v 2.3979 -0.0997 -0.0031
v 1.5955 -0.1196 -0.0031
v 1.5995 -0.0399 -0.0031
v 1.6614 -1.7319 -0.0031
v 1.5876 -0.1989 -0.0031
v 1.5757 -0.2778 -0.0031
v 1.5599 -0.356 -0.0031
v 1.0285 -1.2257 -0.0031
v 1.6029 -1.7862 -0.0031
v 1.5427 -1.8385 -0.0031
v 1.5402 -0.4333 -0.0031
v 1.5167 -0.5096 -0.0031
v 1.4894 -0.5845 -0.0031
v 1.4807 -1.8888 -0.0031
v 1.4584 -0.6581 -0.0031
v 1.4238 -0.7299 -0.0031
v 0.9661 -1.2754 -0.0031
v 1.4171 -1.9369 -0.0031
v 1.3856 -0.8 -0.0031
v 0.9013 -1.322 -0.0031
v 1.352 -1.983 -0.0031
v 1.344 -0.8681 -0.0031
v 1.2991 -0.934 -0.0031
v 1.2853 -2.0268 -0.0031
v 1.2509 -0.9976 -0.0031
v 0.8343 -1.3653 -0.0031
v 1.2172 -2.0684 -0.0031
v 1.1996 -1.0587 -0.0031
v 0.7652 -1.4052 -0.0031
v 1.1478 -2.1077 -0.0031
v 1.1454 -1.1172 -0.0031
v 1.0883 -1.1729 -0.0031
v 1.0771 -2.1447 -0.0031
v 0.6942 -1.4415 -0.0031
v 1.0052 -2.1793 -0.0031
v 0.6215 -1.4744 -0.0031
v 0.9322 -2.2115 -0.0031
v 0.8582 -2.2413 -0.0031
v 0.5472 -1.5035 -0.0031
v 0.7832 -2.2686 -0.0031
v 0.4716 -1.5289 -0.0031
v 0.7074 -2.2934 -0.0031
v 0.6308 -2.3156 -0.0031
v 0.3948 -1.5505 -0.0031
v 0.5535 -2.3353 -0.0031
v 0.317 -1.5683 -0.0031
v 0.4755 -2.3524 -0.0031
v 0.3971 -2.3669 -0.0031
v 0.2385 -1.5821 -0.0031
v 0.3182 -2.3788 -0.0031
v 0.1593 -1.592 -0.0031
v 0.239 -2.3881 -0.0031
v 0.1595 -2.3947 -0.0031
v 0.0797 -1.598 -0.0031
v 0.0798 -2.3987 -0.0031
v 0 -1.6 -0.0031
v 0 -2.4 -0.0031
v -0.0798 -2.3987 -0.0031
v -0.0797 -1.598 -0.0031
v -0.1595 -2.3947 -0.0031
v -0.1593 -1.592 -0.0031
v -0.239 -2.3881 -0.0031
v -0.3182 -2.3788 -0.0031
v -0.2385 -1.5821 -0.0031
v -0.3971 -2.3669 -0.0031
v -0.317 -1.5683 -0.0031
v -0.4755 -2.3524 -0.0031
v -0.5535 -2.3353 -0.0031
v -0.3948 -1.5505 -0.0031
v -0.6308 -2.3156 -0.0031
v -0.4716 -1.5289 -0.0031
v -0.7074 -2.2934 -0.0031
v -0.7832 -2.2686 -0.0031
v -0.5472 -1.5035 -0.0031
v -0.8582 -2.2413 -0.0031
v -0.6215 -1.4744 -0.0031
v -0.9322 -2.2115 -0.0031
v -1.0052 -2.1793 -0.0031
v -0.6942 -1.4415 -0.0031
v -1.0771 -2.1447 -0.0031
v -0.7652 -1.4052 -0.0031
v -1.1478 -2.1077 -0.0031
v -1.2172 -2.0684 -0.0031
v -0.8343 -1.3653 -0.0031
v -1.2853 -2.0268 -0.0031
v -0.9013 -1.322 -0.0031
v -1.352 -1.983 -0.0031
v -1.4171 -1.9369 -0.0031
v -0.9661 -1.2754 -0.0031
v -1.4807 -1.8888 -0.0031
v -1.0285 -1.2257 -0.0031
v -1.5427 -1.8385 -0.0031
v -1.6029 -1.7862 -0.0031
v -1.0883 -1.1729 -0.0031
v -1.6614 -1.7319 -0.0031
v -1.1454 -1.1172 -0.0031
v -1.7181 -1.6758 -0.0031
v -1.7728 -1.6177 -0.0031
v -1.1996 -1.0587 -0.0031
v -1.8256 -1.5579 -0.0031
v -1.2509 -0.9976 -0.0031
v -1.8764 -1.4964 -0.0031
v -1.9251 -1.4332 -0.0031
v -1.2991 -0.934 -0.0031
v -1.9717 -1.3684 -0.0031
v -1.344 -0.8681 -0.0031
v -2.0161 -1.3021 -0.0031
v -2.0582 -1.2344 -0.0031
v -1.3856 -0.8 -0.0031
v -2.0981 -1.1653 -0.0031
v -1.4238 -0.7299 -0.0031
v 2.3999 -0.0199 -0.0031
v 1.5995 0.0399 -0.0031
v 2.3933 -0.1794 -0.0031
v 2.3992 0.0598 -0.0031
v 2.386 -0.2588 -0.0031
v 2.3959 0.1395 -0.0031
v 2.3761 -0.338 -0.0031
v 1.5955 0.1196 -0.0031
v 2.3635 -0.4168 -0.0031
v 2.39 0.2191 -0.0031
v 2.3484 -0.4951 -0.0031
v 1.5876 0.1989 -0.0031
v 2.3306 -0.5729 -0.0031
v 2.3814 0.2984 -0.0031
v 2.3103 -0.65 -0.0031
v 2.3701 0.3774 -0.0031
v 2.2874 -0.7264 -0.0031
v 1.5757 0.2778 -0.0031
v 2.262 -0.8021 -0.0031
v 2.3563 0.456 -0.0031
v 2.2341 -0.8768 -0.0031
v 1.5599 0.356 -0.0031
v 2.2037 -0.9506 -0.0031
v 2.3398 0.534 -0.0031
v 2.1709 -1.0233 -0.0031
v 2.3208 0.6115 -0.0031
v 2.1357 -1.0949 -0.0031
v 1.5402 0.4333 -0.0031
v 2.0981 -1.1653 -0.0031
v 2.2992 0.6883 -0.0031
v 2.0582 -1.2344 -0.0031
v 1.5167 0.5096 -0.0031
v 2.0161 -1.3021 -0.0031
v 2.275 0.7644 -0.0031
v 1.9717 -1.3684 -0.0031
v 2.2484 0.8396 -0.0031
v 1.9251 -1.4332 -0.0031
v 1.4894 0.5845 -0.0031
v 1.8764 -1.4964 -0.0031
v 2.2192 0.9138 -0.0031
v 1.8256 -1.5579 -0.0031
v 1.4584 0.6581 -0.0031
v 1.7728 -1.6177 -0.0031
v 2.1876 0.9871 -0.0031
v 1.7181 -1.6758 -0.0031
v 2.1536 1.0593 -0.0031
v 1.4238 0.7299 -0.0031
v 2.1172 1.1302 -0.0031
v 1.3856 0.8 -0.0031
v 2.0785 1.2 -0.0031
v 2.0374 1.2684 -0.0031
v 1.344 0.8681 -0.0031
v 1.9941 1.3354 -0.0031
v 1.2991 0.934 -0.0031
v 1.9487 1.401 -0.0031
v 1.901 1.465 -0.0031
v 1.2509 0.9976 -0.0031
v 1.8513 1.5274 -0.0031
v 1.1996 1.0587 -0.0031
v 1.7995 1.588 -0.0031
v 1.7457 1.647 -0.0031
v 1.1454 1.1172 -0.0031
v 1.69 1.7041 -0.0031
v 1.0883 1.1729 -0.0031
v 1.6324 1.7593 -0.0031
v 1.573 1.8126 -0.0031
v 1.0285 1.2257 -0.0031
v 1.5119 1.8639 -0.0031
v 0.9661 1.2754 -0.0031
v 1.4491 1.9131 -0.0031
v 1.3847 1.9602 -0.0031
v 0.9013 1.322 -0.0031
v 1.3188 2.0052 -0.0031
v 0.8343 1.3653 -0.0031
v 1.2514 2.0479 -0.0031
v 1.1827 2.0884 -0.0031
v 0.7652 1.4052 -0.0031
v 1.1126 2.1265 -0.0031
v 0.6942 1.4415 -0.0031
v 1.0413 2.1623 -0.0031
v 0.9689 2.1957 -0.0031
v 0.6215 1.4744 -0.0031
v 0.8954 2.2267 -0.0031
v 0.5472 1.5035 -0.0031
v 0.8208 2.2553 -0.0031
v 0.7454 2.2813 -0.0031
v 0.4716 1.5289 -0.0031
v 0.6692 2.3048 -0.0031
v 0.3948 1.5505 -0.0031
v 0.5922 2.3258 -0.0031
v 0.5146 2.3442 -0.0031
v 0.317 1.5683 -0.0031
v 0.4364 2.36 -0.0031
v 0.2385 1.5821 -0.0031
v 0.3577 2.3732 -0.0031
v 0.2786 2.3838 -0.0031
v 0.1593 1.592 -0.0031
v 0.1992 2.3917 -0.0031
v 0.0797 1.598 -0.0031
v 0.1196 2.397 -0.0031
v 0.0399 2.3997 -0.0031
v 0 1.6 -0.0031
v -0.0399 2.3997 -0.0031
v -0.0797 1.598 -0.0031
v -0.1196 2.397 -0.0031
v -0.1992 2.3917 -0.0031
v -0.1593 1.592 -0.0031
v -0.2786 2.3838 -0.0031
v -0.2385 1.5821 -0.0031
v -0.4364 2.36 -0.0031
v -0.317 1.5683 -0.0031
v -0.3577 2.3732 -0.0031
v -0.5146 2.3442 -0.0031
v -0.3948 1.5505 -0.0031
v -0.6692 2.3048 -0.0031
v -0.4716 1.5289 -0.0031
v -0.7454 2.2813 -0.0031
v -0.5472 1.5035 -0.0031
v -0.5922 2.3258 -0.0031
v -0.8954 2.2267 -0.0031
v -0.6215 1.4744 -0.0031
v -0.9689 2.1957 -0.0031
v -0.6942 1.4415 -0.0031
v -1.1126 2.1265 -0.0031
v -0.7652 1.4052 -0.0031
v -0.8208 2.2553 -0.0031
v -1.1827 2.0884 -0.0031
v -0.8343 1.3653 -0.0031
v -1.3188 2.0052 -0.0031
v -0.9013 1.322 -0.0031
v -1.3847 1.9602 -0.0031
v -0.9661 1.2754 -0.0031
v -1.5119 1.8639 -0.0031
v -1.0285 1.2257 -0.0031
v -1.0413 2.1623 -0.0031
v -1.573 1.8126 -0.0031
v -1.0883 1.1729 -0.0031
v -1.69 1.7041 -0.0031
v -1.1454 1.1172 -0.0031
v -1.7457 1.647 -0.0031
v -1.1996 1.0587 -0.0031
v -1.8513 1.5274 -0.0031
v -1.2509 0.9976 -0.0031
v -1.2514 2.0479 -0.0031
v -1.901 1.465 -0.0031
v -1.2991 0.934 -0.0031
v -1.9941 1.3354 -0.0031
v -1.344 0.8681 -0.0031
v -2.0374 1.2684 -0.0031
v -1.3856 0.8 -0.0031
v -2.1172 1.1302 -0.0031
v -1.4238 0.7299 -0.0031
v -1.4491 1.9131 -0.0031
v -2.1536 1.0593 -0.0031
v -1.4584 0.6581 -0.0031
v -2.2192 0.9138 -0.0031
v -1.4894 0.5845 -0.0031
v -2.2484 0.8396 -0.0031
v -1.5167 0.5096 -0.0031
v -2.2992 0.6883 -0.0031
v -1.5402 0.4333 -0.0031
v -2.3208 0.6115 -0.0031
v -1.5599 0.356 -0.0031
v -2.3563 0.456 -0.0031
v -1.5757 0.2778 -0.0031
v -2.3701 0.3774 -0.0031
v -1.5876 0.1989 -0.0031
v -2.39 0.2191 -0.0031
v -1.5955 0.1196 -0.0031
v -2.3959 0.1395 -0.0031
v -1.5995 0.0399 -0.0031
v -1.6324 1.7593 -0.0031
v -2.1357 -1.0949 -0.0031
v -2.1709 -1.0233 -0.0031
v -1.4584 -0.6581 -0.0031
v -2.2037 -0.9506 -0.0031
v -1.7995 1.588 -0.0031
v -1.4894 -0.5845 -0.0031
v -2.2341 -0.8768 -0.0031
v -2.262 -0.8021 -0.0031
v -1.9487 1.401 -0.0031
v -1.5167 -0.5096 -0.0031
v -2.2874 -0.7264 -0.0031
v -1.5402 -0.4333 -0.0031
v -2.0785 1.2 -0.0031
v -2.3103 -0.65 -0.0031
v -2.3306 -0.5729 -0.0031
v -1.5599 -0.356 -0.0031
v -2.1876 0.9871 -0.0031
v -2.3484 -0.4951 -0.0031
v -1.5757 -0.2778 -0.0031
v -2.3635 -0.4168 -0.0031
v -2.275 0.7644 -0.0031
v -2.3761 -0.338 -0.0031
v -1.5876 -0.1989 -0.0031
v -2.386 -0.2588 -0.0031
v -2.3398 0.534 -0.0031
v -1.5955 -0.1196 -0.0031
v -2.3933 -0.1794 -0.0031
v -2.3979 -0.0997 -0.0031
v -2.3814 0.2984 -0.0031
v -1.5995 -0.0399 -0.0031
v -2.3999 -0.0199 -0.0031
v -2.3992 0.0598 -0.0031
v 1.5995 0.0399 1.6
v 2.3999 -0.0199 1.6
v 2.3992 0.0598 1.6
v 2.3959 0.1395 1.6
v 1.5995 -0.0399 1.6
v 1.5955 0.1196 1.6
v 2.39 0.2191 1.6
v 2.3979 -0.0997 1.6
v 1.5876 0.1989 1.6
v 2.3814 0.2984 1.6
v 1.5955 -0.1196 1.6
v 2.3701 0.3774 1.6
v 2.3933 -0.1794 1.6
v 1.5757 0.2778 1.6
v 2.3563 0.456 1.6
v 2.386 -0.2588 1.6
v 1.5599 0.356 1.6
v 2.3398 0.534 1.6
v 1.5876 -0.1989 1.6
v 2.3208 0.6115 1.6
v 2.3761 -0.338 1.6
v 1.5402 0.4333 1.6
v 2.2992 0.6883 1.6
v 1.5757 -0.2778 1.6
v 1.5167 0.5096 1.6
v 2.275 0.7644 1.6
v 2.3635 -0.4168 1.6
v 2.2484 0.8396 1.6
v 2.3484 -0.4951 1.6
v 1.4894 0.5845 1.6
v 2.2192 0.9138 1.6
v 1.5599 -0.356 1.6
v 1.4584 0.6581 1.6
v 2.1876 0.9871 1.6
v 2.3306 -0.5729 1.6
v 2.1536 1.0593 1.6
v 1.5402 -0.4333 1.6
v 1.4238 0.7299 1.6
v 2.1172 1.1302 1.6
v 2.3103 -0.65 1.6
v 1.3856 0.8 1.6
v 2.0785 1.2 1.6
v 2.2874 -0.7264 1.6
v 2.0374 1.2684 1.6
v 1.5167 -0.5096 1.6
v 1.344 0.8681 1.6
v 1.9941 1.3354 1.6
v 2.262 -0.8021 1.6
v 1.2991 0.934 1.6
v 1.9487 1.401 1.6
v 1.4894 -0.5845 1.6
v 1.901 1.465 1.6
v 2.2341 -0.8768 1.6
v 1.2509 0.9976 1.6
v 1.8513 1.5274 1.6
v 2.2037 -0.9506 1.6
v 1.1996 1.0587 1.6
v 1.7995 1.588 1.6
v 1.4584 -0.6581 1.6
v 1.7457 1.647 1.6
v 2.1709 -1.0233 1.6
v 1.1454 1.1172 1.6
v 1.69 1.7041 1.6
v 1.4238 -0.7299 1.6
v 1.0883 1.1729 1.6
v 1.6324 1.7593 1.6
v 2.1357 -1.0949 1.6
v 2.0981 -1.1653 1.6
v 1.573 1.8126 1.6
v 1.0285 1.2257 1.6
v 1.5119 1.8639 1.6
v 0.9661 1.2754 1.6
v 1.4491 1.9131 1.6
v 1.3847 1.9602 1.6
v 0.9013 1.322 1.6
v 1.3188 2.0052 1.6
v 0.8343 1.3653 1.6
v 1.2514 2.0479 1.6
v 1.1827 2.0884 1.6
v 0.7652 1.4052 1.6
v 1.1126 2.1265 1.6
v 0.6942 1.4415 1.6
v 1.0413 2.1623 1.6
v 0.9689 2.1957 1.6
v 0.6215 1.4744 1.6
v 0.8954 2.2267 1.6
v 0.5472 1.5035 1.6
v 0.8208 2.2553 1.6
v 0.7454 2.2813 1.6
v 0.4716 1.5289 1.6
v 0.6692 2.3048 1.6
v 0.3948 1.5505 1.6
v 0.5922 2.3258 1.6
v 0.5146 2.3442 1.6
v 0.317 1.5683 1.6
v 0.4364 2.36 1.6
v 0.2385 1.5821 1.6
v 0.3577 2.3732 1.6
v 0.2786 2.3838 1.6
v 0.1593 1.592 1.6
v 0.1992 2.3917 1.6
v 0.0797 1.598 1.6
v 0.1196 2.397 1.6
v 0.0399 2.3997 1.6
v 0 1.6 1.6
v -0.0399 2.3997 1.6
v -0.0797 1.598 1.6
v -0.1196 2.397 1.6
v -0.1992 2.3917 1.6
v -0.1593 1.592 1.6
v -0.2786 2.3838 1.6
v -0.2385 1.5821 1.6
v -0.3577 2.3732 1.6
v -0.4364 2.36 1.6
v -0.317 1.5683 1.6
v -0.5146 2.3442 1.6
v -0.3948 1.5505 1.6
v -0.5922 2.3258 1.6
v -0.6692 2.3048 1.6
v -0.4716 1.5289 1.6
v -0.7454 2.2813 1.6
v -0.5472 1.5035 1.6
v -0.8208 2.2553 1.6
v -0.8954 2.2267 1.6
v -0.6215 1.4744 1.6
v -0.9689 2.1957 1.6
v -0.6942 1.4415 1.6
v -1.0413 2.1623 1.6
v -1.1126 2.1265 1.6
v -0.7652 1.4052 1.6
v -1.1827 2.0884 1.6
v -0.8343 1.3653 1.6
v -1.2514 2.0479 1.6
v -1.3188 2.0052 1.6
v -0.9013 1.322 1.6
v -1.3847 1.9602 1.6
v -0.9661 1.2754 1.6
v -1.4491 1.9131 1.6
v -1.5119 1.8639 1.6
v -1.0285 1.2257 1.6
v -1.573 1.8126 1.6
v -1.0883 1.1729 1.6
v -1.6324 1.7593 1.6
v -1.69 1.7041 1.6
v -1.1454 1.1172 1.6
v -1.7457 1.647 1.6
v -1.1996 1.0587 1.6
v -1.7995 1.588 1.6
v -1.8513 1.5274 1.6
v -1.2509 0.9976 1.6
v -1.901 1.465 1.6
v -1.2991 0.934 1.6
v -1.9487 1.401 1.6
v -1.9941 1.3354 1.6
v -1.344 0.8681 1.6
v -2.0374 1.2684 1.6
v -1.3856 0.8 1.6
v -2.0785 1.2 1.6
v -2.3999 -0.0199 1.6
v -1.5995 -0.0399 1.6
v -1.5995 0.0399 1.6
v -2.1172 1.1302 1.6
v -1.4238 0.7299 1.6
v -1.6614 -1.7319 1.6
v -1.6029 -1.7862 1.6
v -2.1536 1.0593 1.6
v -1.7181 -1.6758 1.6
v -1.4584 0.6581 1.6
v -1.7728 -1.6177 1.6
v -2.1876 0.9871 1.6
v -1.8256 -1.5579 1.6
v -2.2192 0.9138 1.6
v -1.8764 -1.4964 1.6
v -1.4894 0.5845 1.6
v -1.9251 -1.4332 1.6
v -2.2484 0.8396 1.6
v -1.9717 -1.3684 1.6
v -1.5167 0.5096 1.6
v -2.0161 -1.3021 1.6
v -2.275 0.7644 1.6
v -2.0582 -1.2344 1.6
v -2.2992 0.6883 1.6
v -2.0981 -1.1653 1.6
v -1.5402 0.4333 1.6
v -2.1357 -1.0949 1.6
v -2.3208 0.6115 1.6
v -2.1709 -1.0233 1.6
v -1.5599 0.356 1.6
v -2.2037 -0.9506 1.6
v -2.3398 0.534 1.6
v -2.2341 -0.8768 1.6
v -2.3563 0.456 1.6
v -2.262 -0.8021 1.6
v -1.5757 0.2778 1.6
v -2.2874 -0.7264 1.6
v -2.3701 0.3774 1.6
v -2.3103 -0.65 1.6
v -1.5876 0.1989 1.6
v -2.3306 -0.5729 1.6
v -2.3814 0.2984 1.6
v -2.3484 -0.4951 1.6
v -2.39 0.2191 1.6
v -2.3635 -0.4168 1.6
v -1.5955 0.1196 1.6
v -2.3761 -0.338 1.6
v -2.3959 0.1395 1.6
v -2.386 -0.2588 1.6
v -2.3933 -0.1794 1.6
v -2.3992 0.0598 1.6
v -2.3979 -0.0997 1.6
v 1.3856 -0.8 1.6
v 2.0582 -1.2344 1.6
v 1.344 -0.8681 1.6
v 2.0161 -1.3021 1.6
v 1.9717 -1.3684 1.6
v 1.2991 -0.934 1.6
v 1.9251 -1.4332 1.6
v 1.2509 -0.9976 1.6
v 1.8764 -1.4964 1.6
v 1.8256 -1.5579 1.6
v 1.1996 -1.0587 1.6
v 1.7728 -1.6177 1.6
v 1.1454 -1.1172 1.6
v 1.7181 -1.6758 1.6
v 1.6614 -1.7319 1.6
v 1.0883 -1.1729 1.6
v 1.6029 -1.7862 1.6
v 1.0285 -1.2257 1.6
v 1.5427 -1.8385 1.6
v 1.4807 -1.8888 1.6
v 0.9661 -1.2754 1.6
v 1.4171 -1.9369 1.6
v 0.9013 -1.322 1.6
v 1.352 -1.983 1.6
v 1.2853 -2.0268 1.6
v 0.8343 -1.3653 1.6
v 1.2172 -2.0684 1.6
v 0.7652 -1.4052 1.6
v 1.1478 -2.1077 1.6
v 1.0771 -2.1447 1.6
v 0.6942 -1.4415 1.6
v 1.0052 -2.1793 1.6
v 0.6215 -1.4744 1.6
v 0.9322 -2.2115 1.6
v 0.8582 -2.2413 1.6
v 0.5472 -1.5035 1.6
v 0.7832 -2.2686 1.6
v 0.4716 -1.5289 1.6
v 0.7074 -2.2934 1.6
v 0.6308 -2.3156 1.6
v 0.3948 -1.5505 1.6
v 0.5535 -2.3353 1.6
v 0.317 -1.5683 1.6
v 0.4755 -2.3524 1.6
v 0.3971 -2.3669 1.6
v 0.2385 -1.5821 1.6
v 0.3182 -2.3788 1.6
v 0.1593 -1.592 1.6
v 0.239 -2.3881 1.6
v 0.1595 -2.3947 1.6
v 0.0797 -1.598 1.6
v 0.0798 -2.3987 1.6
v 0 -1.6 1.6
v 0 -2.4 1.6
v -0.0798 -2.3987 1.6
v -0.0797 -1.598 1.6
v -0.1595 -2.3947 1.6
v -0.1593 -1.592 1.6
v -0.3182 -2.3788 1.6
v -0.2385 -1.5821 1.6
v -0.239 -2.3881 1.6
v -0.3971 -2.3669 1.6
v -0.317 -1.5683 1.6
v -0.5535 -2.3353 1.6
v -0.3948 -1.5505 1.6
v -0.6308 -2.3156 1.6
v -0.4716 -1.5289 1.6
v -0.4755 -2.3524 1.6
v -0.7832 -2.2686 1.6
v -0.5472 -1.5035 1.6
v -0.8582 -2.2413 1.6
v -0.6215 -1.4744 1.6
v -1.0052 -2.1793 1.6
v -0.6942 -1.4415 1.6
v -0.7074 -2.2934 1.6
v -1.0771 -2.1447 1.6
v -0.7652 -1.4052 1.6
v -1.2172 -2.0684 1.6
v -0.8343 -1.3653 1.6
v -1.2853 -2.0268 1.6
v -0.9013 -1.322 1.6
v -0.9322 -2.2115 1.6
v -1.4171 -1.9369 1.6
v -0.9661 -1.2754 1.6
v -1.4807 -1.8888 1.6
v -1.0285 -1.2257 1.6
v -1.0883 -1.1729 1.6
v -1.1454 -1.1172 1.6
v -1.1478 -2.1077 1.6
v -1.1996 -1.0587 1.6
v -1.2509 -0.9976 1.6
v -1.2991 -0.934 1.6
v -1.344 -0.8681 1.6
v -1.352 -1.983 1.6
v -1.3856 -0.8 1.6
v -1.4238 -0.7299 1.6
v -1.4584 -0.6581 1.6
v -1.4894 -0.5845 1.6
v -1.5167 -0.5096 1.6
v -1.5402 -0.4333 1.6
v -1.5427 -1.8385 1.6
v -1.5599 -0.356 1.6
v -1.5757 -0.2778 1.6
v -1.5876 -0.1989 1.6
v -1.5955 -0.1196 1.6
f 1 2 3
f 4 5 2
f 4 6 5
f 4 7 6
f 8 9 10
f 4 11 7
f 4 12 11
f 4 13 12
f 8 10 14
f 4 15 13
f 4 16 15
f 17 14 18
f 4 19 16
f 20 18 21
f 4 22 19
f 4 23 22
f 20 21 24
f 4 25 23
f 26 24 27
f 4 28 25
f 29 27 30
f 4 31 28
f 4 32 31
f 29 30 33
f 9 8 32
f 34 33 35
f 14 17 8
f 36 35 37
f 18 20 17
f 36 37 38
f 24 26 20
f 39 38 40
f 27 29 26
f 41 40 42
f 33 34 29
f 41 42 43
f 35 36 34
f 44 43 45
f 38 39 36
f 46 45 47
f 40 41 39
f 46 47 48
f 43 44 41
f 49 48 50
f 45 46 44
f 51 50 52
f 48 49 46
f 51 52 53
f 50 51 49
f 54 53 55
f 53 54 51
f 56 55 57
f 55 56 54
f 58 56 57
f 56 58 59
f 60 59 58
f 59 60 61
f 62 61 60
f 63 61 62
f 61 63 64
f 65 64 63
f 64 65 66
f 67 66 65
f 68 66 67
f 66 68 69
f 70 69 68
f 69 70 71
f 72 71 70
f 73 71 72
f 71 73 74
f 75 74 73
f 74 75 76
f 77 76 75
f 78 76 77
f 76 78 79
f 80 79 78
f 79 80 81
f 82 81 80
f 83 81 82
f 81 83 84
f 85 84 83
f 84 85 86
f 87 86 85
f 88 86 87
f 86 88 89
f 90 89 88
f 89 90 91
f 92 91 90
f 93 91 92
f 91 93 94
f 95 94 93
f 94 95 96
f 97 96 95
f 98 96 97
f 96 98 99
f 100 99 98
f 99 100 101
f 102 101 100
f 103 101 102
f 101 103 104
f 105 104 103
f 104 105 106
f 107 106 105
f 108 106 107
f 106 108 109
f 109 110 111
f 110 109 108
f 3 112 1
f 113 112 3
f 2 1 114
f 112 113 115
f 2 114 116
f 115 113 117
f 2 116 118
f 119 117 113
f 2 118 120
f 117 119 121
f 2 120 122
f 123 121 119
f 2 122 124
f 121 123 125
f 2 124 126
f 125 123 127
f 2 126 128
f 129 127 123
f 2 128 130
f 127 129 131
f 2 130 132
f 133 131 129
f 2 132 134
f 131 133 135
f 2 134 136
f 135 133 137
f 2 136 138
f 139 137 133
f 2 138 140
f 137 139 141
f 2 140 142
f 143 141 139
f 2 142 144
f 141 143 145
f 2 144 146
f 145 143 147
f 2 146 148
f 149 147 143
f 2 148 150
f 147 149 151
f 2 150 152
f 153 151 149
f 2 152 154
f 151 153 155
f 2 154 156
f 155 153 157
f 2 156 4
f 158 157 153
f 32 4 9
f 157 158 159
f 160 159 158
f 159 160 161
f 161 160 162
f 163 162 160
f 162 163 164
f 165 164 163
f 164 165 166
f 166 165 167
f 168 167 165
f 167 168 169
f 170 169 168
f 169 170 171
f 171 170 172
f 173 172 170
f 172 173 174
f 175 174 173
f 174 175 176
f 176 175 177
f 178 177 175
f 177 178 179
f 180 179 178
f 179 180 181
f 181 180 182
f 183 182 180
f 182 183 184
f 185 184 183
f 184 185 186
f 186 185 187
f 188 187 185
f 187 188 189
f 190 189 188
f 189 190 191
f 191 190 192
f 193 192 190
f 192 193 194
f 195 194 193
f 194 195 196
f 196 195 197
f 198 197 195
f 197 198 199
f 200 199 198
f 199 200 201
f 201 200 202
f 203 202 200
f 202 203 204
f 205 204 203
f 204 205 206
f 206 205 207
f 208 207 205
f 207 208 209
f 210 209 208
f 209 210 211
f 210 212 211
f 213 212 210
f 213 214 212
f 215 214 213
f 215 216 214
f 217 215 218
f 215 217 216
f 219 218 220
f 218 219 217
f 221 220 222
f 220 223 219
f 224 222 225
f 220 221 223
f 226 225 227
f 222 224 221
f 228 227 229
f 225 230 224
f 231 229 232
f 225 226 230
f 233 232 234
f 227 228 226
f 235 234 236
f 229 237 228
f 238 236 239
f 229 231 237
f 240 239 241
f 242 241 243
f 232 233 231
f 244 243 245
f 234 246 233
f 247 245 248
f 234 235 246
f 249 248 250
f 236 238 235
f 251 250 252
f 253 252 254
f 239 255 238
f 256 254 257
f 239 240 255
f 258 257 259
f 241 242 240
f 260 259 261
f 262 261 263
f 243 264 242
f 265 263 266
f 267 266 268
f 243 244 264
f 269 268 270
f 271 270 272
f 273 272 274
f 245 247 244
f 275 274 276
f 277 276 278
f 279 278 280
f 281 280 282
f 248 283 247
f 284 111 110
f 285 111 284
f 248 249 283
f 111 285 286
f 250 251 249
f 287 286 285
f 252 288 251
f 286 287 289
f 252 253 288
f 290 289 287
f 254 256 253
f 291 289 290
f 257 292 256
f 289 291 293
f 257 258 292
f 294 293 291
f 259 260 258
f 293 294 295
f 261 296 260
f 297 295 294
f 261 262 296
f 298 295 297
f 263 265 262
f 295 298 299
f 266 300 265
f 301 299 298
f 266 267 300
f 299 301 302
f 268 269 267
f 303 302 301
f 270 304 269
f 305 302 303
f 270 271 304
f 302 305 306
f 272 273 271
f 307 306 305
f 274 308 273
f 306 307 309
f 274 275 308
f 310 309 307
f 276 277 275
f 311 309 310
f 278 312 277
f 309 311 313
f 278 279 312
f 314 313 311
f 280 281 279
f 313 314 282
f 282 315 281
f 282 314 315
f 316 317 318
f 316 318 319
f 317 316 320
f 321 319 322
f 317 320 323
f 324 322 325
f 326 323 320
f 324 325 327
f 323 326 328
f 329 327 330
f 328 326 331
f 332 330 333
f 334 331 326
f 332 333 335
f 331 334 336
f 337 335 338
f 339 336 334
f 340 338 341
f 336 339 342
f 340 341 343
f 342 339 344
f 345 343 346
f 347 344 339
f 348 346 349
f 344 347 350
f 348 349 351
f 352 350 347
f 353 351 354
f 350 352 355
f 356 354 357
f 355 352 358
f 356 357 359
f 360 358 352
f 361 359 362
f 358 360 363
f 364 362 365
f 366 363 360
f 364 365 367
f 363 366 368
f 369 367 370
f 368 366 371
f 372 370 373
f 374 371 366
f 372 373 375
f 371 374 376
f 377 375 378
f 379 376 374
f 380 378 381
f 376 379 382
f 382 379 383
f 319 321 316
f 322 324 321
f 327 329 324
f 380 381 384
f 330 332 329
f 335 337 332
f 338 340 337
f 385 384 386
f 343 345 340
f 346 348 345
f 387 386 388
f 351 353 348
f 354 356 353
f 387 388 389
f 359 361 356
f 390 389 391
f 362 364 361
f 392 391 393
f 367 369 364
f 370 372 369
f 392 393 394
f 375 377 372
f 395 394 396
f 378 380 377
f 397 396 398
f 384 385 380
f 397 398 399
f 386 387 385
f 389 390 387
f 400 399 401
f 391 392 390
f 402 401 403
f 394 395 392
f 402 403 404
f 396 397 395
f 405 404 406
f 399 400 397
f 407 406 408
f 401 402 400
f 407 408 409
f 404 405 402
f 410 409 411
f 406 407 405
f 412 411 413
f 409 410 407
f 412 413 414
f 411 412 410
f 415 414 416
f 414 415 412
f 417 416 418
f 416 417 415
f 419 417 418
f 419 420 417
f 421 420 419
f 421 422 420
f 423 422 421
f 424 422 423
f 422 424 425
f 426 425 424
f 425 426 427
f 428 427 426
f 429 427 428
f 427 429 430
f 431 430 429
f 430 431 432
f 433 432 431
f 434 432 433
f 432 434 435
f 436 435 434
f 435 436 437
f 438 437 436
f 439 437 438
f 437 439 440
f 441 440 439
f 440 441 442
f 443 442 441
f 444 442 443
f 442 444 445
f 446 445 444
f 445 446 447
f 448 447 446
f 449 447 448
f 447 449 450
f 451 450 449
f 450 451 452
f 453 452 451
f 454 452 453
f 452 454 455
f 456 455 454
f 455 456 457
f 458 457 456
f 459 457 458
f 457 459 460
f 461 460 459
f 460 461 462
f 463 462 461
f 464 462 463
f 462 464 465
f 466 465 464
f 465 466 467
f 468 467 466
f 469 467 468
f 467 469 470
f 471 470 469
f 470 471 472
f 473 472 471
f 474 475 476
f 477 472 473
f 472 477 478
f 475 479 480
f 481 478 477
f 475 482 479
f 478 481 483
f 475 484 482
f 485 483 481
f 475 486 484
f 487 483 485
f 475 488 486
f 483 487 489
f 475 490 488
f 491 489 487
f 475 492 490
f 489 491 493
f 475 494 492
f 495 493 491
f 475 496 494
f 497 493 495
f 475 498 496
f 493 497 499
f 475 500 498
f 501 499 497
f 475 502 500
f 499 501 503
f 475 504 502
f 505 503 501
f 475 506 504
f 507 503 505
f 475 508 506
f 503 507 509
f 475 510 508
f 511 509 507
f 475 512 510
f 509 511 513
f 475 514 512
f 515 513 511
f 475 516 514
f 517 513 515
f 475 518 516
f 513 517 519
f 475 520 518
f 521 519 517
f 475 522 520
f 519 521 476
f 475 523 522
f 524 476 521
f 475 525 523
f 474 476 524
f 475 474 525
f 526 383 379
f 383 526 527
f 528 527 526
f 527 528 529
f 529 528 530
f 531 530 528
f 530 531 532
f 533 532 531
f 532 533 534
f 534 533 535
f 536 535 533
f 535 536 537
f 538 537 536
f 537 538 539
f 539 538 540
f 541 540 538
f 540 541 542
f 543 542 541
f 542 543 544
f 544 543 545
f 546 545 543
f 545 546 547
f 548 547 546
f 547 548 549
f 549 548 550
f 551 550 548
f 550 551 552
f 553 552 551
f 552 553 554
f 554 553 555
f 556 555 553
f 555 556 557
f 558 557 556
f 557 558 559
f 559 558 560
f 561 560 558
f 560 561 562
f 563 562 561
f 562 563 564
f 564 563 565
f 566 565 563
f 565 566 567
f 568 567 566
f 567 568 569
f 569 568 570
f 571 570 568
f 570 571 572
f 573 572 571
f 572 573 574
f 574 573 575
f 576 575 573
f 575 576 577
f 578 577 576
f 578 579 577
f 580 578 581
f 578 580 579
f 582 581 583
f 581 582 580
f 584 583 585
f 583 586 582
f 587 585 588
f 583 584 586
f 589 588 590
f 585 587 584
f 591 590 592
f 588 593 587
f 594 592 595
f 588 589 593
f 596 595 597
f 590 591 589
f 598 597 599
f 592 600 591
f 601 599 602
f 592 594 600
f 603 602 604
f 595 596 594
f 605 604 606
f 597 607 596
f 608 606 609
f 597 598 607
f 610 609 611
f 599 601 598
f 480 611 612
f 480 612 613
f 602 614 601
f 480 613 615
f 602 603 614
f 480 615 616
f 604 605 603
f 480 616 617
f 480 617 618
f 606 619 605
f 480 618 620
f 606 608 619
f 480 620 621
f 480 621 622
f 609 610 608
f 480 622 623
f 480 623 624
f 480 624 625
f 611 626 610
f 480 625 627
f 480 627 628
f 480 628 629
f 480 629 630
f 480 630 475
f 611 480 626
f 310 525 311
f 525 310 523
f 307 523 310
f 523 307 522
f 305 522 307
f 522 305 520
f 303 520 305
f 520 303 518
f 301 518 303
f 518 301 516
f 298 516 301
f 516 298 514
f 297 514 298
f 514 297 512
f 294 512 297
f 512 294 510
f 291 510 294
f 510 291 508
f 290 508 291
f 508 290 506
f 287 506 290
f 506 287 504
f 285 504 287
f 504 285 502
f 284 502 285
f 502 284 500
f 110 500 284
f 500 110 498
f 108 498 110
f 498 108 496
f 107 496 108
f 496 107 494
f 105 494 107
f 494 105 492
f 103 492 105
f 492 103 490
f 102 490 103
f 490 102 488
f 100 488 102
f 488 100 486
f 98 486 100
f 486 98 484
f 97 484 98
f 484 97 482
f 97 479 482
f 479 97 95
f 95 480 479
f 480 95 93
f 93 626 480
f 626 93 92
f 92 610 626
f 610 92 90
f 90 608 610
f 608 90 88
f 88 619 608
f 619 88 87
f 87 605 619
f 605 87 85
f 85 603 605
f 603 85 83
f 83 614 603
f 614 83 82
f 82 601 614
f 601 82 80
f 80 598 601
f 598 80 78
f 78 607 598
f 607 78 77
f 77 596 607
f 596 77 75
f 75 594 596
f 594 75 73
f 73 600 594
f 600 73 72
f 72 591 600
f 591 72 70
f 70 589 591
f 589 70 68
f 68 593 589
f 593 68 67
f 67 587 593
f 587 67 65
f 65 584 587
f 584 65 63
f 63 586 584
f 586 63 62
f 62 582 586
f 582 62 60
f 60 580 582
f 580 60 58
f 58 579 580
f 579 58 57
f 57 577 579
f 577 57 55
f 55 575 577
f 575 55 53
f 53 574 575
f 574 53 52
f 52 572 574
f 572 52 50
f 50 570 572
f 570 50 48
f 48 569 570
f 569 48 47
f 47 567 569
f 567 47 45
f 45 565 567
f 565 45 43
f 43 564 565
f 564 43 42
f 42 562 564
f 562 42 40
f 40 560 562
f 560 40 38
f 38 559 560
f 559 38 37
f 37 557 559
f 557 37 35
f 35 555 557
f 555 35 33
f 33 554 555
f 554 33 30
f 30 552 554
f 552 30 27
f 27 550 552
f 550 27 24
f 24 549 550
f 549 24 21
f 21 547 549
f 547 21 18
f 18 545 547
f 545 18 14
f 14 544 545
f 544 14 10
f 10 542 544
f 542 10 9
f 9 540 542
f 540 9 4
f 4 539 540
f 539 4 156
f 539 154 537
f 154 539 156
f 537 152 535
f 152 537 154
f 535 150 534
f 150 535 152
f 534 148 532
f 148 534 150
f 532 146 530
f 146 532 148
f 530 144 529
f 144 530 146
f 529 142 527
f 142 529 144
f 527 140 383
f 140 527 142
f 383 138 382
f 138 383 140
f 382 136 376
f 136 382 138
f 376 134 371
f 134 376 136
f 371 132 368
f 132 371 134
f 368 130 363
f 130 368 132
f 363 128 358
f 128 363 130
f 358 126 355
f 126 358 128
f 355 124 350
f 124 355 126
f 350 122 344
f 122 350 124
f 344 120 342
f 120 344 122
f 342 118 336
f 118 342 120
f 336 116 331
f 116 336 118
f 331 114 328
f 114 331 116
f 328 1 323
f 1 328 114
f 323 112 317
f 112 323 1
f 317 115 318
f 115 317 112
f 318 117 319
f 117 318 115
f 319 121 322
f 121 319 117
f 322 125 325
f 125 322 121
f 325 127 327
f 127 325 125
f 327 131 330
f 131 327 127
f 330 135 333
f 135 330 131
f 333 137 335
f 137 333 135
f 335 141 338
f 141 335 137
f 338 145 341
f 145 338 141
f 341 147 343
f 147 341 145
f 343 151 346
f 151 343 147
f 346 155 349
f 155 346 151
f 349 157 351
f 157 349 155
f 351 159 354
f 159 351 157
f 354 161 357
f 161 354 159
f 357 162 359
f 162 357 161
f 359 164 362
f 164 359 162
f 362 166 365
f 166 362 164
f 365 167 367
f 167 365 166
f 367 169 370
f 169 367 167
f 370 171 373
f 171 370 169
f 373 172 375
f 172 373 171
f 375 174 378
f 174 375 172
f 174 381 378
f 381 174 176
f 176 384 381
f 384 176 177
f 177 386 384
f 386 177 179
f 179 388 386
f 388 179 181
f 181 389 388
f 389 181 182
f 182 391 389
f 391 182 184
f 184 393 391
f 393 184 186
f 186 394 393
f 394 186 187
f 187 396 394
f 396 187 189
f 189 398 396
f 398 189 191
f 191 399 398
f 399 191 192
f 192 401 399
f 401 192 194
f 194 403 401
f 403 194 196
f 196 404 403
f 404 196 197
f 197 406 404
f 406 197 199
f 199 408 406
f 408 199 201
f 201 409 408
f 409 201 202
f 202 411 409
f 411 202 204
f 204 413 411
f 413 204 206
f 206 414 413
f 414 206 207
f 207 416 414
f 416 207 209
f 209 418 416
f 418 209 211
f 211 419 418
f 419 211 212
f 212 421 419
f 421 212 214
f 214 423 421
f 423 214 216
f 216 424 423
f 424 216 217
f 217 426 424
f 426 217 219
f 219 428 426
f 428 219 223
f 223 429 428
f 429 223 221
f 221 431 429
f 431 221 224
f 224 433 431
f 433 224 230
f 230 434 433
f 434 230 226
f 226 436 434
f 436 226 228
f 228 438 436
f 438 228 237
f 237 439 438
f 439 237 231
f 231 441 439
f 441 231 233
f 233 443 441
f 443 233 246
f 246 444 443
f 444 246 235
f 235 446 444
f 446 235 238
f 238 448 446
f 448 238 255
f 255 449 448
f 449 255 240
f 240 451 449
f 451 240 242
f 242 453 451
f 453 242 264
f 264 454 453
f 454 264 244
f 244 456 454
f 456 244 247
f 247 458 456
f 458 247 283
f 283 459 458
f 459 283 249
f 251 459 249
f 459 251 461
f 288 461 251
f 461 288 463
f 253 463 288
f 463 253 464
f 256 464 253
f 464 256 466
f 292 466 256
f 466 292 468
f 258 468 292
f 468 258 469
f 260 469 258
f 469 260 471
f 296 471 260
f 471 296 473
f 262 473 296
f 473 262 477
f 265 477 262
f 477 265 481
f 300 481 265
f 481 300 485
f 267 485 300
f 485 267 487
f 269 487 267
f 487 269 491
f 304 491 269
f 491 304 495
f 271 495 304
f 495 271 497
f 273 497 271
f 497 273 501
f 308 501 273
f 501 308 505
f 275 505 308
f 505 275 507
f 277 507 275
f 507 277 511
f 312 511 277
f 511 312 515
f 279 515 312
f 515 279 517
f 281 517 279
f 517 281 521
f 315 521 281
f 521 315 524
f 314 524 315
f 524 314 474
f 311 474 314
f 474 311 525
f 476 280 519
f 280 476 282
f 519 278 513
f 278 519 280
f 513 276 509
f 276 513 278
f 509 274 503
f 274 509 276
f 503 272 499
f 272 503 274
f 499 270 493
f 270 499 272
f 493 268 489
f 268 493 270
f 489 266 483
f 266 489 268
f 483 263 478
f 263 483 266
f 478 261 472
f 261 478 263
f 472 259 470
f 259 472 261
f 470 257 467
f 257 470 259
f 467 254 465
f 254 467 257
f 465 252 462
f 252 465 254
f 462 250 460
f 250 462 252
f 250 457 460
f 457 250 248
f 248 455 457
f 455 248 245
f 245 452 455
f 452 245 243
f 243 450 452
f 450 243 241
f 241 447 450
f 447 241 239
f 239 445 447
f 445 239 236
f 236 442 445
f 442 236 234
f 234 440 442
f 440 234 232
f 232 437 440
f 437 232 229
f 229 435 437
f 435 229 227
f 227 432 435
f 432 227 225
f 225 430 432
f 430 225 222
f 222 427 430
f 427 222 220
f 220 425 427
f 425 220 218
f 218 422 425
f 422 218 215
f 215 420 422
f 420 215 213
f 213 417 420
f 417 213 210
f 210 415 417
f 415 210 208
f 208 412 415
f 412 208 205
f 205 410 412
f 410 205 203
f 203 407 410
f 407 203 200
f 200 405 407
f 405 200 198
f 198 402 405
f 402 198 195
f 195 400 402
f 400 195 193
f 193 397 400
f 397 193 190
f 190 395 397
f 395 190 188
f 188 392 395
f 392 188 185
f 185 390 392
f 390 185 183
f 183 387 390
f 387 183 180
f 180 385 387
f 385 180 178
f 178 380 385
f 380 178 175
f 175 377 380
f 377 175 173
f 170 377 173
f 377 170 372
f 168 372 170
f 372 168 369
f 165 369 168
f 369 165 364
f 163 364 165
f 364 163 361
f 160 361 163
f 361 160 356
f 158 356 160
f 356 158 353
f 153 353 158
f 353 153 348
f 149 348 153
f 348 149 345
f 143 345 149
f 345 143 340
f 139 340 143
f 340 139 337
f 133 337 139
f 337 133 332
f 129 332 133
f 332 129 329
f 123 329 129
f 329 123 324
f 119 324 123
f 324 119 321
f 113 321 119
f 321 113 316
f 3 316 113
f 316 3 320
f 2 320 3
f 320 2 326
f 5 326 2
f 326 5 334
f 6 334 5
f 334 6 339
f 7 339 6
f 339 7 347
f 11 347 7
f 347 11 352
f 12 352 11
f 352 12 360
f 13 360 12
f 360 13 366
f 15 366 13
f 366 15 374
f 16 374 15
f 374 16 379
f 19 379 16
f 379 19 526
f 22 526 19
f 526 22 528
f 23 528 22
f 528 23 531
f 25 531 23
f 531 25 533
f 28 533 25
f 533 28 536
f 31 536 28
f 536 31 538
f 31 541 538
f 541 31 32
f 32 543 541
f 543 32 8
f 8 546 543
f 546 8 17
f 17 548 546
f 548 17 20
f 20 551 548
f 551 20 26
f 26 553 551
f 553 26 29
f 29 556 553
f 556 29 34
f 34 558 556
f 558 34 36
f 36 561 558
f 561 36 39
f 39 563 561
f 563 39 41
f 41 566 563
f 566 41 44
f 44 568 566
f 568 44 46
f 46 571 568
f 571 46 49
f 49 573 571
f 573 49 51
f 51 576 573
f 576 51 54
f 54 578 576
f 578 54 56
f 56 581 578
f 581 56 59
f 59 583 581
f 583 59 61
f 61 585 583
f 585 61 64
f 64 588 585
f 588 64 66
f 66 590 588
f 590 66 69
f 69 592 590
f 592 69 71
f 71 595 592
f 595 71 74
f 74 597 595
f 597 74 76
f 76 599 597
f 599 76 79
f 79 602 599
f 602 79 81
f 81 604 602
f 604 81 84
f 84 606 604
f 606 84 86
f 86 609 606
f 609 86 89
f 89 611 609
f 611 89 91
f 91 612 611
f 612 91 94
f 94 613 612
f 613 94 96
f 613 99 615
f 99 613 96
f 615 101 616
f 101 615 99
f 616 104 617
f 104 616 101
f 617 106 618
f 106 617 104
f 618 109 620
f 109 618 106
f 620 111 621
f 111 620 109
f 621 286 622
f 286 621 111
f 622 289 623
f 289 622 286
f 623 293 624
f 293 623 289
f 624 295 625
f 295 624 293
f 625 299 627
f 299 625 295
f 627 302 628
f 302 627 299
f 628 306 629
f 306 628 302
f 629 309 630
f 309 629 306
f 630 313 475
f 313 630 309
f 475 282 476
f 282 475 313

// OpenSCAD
use <../lib.scad>
use <s/4181s01.scad>
use <s/4181s02.scad>
use <../p/stud2.scad>
$fa=1; $fs=0.2;
function ldraw_lib__4182p07(realsolid=false) = [
// 0 Train Door  1 x  4 x  5 Right with Yellow Stripe Pattern
// 0 Name: 4182p07.dat
// 0 Author: William Howard [WilliamH]
// 0 !LDRAW_ORG Part UPDATE 2009-01
// 0 !LICENSE Licensed under CC BY 2.0 and CC BY 4.0 : see CAreadme.txt
// 
// 0 BFC CERTIFY CCW
  [0,"BFC","CERTIFY"],
  [0,"BFC","CCW"],
// 
// 0 !HISTORY 2009-05-02 [PTadmin] Official Update 2009-01
// 
// 
// 1 16 0 0 0 1 0 0 0 1 0 0 0 1 stud2.dat
  [1,16,0,0,0,1,0,0,0,1,0,0,0,1, ldraw_lib__stud2(realsolid)],
// 1 16 0 0 0 -1 0 0 0 1 0 0 0 1 s\4181s01.dat
  [1,16,0,0,0,-1,0,0,0,1,0,0,0,1, ldraw_lib__s__4181s01(realsolid)],
// 1 16 0 72 0 -1 0 0 0 3 0 0 0 1 s\4181s02.dat
  [1,16,0,72,0,-1,0,0,0,3,0,0,0,1, ldraw_lib__s__4181s02(realsolid)],
// 1 14 0 96 0 -1 0 0 0 3 0 0 0 1 s\4181s02.dat
  [1,14,0,96,0,-1,0,0,0,3,0,0,0,1, ldraw_lib__s__4181s02(realsolid)],
// 0
];
module ldraw_lib__4182p07(step=0, col=false, unit=2/5, alt=false, line=0.2, solid=!$preview)
    makepoly(ldraw_lib__4182p07(solid), step=step, col=col, unit=unit, alt=alt, line=line, solid=solid);
ldraw_lib__4182p07(line=0.2);
